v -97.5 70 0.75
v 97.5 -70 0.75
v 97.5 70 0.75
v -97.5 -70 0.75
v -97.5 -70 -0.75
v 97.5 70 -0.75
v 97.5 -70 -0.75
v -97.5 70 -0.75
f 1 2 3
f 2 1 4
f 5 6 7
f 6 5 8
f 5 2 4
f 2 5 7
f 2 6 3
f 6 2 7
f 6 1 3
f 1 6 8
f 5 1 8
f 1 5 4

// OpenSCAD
// ========================================
// a 195 x 140 x 1.5 mm plate
// NeuroCAD canonical IR; dimensions are millimetres
// ========================================
$fn = 48;

cube(size=[195, 140, 1.5], center=true);
